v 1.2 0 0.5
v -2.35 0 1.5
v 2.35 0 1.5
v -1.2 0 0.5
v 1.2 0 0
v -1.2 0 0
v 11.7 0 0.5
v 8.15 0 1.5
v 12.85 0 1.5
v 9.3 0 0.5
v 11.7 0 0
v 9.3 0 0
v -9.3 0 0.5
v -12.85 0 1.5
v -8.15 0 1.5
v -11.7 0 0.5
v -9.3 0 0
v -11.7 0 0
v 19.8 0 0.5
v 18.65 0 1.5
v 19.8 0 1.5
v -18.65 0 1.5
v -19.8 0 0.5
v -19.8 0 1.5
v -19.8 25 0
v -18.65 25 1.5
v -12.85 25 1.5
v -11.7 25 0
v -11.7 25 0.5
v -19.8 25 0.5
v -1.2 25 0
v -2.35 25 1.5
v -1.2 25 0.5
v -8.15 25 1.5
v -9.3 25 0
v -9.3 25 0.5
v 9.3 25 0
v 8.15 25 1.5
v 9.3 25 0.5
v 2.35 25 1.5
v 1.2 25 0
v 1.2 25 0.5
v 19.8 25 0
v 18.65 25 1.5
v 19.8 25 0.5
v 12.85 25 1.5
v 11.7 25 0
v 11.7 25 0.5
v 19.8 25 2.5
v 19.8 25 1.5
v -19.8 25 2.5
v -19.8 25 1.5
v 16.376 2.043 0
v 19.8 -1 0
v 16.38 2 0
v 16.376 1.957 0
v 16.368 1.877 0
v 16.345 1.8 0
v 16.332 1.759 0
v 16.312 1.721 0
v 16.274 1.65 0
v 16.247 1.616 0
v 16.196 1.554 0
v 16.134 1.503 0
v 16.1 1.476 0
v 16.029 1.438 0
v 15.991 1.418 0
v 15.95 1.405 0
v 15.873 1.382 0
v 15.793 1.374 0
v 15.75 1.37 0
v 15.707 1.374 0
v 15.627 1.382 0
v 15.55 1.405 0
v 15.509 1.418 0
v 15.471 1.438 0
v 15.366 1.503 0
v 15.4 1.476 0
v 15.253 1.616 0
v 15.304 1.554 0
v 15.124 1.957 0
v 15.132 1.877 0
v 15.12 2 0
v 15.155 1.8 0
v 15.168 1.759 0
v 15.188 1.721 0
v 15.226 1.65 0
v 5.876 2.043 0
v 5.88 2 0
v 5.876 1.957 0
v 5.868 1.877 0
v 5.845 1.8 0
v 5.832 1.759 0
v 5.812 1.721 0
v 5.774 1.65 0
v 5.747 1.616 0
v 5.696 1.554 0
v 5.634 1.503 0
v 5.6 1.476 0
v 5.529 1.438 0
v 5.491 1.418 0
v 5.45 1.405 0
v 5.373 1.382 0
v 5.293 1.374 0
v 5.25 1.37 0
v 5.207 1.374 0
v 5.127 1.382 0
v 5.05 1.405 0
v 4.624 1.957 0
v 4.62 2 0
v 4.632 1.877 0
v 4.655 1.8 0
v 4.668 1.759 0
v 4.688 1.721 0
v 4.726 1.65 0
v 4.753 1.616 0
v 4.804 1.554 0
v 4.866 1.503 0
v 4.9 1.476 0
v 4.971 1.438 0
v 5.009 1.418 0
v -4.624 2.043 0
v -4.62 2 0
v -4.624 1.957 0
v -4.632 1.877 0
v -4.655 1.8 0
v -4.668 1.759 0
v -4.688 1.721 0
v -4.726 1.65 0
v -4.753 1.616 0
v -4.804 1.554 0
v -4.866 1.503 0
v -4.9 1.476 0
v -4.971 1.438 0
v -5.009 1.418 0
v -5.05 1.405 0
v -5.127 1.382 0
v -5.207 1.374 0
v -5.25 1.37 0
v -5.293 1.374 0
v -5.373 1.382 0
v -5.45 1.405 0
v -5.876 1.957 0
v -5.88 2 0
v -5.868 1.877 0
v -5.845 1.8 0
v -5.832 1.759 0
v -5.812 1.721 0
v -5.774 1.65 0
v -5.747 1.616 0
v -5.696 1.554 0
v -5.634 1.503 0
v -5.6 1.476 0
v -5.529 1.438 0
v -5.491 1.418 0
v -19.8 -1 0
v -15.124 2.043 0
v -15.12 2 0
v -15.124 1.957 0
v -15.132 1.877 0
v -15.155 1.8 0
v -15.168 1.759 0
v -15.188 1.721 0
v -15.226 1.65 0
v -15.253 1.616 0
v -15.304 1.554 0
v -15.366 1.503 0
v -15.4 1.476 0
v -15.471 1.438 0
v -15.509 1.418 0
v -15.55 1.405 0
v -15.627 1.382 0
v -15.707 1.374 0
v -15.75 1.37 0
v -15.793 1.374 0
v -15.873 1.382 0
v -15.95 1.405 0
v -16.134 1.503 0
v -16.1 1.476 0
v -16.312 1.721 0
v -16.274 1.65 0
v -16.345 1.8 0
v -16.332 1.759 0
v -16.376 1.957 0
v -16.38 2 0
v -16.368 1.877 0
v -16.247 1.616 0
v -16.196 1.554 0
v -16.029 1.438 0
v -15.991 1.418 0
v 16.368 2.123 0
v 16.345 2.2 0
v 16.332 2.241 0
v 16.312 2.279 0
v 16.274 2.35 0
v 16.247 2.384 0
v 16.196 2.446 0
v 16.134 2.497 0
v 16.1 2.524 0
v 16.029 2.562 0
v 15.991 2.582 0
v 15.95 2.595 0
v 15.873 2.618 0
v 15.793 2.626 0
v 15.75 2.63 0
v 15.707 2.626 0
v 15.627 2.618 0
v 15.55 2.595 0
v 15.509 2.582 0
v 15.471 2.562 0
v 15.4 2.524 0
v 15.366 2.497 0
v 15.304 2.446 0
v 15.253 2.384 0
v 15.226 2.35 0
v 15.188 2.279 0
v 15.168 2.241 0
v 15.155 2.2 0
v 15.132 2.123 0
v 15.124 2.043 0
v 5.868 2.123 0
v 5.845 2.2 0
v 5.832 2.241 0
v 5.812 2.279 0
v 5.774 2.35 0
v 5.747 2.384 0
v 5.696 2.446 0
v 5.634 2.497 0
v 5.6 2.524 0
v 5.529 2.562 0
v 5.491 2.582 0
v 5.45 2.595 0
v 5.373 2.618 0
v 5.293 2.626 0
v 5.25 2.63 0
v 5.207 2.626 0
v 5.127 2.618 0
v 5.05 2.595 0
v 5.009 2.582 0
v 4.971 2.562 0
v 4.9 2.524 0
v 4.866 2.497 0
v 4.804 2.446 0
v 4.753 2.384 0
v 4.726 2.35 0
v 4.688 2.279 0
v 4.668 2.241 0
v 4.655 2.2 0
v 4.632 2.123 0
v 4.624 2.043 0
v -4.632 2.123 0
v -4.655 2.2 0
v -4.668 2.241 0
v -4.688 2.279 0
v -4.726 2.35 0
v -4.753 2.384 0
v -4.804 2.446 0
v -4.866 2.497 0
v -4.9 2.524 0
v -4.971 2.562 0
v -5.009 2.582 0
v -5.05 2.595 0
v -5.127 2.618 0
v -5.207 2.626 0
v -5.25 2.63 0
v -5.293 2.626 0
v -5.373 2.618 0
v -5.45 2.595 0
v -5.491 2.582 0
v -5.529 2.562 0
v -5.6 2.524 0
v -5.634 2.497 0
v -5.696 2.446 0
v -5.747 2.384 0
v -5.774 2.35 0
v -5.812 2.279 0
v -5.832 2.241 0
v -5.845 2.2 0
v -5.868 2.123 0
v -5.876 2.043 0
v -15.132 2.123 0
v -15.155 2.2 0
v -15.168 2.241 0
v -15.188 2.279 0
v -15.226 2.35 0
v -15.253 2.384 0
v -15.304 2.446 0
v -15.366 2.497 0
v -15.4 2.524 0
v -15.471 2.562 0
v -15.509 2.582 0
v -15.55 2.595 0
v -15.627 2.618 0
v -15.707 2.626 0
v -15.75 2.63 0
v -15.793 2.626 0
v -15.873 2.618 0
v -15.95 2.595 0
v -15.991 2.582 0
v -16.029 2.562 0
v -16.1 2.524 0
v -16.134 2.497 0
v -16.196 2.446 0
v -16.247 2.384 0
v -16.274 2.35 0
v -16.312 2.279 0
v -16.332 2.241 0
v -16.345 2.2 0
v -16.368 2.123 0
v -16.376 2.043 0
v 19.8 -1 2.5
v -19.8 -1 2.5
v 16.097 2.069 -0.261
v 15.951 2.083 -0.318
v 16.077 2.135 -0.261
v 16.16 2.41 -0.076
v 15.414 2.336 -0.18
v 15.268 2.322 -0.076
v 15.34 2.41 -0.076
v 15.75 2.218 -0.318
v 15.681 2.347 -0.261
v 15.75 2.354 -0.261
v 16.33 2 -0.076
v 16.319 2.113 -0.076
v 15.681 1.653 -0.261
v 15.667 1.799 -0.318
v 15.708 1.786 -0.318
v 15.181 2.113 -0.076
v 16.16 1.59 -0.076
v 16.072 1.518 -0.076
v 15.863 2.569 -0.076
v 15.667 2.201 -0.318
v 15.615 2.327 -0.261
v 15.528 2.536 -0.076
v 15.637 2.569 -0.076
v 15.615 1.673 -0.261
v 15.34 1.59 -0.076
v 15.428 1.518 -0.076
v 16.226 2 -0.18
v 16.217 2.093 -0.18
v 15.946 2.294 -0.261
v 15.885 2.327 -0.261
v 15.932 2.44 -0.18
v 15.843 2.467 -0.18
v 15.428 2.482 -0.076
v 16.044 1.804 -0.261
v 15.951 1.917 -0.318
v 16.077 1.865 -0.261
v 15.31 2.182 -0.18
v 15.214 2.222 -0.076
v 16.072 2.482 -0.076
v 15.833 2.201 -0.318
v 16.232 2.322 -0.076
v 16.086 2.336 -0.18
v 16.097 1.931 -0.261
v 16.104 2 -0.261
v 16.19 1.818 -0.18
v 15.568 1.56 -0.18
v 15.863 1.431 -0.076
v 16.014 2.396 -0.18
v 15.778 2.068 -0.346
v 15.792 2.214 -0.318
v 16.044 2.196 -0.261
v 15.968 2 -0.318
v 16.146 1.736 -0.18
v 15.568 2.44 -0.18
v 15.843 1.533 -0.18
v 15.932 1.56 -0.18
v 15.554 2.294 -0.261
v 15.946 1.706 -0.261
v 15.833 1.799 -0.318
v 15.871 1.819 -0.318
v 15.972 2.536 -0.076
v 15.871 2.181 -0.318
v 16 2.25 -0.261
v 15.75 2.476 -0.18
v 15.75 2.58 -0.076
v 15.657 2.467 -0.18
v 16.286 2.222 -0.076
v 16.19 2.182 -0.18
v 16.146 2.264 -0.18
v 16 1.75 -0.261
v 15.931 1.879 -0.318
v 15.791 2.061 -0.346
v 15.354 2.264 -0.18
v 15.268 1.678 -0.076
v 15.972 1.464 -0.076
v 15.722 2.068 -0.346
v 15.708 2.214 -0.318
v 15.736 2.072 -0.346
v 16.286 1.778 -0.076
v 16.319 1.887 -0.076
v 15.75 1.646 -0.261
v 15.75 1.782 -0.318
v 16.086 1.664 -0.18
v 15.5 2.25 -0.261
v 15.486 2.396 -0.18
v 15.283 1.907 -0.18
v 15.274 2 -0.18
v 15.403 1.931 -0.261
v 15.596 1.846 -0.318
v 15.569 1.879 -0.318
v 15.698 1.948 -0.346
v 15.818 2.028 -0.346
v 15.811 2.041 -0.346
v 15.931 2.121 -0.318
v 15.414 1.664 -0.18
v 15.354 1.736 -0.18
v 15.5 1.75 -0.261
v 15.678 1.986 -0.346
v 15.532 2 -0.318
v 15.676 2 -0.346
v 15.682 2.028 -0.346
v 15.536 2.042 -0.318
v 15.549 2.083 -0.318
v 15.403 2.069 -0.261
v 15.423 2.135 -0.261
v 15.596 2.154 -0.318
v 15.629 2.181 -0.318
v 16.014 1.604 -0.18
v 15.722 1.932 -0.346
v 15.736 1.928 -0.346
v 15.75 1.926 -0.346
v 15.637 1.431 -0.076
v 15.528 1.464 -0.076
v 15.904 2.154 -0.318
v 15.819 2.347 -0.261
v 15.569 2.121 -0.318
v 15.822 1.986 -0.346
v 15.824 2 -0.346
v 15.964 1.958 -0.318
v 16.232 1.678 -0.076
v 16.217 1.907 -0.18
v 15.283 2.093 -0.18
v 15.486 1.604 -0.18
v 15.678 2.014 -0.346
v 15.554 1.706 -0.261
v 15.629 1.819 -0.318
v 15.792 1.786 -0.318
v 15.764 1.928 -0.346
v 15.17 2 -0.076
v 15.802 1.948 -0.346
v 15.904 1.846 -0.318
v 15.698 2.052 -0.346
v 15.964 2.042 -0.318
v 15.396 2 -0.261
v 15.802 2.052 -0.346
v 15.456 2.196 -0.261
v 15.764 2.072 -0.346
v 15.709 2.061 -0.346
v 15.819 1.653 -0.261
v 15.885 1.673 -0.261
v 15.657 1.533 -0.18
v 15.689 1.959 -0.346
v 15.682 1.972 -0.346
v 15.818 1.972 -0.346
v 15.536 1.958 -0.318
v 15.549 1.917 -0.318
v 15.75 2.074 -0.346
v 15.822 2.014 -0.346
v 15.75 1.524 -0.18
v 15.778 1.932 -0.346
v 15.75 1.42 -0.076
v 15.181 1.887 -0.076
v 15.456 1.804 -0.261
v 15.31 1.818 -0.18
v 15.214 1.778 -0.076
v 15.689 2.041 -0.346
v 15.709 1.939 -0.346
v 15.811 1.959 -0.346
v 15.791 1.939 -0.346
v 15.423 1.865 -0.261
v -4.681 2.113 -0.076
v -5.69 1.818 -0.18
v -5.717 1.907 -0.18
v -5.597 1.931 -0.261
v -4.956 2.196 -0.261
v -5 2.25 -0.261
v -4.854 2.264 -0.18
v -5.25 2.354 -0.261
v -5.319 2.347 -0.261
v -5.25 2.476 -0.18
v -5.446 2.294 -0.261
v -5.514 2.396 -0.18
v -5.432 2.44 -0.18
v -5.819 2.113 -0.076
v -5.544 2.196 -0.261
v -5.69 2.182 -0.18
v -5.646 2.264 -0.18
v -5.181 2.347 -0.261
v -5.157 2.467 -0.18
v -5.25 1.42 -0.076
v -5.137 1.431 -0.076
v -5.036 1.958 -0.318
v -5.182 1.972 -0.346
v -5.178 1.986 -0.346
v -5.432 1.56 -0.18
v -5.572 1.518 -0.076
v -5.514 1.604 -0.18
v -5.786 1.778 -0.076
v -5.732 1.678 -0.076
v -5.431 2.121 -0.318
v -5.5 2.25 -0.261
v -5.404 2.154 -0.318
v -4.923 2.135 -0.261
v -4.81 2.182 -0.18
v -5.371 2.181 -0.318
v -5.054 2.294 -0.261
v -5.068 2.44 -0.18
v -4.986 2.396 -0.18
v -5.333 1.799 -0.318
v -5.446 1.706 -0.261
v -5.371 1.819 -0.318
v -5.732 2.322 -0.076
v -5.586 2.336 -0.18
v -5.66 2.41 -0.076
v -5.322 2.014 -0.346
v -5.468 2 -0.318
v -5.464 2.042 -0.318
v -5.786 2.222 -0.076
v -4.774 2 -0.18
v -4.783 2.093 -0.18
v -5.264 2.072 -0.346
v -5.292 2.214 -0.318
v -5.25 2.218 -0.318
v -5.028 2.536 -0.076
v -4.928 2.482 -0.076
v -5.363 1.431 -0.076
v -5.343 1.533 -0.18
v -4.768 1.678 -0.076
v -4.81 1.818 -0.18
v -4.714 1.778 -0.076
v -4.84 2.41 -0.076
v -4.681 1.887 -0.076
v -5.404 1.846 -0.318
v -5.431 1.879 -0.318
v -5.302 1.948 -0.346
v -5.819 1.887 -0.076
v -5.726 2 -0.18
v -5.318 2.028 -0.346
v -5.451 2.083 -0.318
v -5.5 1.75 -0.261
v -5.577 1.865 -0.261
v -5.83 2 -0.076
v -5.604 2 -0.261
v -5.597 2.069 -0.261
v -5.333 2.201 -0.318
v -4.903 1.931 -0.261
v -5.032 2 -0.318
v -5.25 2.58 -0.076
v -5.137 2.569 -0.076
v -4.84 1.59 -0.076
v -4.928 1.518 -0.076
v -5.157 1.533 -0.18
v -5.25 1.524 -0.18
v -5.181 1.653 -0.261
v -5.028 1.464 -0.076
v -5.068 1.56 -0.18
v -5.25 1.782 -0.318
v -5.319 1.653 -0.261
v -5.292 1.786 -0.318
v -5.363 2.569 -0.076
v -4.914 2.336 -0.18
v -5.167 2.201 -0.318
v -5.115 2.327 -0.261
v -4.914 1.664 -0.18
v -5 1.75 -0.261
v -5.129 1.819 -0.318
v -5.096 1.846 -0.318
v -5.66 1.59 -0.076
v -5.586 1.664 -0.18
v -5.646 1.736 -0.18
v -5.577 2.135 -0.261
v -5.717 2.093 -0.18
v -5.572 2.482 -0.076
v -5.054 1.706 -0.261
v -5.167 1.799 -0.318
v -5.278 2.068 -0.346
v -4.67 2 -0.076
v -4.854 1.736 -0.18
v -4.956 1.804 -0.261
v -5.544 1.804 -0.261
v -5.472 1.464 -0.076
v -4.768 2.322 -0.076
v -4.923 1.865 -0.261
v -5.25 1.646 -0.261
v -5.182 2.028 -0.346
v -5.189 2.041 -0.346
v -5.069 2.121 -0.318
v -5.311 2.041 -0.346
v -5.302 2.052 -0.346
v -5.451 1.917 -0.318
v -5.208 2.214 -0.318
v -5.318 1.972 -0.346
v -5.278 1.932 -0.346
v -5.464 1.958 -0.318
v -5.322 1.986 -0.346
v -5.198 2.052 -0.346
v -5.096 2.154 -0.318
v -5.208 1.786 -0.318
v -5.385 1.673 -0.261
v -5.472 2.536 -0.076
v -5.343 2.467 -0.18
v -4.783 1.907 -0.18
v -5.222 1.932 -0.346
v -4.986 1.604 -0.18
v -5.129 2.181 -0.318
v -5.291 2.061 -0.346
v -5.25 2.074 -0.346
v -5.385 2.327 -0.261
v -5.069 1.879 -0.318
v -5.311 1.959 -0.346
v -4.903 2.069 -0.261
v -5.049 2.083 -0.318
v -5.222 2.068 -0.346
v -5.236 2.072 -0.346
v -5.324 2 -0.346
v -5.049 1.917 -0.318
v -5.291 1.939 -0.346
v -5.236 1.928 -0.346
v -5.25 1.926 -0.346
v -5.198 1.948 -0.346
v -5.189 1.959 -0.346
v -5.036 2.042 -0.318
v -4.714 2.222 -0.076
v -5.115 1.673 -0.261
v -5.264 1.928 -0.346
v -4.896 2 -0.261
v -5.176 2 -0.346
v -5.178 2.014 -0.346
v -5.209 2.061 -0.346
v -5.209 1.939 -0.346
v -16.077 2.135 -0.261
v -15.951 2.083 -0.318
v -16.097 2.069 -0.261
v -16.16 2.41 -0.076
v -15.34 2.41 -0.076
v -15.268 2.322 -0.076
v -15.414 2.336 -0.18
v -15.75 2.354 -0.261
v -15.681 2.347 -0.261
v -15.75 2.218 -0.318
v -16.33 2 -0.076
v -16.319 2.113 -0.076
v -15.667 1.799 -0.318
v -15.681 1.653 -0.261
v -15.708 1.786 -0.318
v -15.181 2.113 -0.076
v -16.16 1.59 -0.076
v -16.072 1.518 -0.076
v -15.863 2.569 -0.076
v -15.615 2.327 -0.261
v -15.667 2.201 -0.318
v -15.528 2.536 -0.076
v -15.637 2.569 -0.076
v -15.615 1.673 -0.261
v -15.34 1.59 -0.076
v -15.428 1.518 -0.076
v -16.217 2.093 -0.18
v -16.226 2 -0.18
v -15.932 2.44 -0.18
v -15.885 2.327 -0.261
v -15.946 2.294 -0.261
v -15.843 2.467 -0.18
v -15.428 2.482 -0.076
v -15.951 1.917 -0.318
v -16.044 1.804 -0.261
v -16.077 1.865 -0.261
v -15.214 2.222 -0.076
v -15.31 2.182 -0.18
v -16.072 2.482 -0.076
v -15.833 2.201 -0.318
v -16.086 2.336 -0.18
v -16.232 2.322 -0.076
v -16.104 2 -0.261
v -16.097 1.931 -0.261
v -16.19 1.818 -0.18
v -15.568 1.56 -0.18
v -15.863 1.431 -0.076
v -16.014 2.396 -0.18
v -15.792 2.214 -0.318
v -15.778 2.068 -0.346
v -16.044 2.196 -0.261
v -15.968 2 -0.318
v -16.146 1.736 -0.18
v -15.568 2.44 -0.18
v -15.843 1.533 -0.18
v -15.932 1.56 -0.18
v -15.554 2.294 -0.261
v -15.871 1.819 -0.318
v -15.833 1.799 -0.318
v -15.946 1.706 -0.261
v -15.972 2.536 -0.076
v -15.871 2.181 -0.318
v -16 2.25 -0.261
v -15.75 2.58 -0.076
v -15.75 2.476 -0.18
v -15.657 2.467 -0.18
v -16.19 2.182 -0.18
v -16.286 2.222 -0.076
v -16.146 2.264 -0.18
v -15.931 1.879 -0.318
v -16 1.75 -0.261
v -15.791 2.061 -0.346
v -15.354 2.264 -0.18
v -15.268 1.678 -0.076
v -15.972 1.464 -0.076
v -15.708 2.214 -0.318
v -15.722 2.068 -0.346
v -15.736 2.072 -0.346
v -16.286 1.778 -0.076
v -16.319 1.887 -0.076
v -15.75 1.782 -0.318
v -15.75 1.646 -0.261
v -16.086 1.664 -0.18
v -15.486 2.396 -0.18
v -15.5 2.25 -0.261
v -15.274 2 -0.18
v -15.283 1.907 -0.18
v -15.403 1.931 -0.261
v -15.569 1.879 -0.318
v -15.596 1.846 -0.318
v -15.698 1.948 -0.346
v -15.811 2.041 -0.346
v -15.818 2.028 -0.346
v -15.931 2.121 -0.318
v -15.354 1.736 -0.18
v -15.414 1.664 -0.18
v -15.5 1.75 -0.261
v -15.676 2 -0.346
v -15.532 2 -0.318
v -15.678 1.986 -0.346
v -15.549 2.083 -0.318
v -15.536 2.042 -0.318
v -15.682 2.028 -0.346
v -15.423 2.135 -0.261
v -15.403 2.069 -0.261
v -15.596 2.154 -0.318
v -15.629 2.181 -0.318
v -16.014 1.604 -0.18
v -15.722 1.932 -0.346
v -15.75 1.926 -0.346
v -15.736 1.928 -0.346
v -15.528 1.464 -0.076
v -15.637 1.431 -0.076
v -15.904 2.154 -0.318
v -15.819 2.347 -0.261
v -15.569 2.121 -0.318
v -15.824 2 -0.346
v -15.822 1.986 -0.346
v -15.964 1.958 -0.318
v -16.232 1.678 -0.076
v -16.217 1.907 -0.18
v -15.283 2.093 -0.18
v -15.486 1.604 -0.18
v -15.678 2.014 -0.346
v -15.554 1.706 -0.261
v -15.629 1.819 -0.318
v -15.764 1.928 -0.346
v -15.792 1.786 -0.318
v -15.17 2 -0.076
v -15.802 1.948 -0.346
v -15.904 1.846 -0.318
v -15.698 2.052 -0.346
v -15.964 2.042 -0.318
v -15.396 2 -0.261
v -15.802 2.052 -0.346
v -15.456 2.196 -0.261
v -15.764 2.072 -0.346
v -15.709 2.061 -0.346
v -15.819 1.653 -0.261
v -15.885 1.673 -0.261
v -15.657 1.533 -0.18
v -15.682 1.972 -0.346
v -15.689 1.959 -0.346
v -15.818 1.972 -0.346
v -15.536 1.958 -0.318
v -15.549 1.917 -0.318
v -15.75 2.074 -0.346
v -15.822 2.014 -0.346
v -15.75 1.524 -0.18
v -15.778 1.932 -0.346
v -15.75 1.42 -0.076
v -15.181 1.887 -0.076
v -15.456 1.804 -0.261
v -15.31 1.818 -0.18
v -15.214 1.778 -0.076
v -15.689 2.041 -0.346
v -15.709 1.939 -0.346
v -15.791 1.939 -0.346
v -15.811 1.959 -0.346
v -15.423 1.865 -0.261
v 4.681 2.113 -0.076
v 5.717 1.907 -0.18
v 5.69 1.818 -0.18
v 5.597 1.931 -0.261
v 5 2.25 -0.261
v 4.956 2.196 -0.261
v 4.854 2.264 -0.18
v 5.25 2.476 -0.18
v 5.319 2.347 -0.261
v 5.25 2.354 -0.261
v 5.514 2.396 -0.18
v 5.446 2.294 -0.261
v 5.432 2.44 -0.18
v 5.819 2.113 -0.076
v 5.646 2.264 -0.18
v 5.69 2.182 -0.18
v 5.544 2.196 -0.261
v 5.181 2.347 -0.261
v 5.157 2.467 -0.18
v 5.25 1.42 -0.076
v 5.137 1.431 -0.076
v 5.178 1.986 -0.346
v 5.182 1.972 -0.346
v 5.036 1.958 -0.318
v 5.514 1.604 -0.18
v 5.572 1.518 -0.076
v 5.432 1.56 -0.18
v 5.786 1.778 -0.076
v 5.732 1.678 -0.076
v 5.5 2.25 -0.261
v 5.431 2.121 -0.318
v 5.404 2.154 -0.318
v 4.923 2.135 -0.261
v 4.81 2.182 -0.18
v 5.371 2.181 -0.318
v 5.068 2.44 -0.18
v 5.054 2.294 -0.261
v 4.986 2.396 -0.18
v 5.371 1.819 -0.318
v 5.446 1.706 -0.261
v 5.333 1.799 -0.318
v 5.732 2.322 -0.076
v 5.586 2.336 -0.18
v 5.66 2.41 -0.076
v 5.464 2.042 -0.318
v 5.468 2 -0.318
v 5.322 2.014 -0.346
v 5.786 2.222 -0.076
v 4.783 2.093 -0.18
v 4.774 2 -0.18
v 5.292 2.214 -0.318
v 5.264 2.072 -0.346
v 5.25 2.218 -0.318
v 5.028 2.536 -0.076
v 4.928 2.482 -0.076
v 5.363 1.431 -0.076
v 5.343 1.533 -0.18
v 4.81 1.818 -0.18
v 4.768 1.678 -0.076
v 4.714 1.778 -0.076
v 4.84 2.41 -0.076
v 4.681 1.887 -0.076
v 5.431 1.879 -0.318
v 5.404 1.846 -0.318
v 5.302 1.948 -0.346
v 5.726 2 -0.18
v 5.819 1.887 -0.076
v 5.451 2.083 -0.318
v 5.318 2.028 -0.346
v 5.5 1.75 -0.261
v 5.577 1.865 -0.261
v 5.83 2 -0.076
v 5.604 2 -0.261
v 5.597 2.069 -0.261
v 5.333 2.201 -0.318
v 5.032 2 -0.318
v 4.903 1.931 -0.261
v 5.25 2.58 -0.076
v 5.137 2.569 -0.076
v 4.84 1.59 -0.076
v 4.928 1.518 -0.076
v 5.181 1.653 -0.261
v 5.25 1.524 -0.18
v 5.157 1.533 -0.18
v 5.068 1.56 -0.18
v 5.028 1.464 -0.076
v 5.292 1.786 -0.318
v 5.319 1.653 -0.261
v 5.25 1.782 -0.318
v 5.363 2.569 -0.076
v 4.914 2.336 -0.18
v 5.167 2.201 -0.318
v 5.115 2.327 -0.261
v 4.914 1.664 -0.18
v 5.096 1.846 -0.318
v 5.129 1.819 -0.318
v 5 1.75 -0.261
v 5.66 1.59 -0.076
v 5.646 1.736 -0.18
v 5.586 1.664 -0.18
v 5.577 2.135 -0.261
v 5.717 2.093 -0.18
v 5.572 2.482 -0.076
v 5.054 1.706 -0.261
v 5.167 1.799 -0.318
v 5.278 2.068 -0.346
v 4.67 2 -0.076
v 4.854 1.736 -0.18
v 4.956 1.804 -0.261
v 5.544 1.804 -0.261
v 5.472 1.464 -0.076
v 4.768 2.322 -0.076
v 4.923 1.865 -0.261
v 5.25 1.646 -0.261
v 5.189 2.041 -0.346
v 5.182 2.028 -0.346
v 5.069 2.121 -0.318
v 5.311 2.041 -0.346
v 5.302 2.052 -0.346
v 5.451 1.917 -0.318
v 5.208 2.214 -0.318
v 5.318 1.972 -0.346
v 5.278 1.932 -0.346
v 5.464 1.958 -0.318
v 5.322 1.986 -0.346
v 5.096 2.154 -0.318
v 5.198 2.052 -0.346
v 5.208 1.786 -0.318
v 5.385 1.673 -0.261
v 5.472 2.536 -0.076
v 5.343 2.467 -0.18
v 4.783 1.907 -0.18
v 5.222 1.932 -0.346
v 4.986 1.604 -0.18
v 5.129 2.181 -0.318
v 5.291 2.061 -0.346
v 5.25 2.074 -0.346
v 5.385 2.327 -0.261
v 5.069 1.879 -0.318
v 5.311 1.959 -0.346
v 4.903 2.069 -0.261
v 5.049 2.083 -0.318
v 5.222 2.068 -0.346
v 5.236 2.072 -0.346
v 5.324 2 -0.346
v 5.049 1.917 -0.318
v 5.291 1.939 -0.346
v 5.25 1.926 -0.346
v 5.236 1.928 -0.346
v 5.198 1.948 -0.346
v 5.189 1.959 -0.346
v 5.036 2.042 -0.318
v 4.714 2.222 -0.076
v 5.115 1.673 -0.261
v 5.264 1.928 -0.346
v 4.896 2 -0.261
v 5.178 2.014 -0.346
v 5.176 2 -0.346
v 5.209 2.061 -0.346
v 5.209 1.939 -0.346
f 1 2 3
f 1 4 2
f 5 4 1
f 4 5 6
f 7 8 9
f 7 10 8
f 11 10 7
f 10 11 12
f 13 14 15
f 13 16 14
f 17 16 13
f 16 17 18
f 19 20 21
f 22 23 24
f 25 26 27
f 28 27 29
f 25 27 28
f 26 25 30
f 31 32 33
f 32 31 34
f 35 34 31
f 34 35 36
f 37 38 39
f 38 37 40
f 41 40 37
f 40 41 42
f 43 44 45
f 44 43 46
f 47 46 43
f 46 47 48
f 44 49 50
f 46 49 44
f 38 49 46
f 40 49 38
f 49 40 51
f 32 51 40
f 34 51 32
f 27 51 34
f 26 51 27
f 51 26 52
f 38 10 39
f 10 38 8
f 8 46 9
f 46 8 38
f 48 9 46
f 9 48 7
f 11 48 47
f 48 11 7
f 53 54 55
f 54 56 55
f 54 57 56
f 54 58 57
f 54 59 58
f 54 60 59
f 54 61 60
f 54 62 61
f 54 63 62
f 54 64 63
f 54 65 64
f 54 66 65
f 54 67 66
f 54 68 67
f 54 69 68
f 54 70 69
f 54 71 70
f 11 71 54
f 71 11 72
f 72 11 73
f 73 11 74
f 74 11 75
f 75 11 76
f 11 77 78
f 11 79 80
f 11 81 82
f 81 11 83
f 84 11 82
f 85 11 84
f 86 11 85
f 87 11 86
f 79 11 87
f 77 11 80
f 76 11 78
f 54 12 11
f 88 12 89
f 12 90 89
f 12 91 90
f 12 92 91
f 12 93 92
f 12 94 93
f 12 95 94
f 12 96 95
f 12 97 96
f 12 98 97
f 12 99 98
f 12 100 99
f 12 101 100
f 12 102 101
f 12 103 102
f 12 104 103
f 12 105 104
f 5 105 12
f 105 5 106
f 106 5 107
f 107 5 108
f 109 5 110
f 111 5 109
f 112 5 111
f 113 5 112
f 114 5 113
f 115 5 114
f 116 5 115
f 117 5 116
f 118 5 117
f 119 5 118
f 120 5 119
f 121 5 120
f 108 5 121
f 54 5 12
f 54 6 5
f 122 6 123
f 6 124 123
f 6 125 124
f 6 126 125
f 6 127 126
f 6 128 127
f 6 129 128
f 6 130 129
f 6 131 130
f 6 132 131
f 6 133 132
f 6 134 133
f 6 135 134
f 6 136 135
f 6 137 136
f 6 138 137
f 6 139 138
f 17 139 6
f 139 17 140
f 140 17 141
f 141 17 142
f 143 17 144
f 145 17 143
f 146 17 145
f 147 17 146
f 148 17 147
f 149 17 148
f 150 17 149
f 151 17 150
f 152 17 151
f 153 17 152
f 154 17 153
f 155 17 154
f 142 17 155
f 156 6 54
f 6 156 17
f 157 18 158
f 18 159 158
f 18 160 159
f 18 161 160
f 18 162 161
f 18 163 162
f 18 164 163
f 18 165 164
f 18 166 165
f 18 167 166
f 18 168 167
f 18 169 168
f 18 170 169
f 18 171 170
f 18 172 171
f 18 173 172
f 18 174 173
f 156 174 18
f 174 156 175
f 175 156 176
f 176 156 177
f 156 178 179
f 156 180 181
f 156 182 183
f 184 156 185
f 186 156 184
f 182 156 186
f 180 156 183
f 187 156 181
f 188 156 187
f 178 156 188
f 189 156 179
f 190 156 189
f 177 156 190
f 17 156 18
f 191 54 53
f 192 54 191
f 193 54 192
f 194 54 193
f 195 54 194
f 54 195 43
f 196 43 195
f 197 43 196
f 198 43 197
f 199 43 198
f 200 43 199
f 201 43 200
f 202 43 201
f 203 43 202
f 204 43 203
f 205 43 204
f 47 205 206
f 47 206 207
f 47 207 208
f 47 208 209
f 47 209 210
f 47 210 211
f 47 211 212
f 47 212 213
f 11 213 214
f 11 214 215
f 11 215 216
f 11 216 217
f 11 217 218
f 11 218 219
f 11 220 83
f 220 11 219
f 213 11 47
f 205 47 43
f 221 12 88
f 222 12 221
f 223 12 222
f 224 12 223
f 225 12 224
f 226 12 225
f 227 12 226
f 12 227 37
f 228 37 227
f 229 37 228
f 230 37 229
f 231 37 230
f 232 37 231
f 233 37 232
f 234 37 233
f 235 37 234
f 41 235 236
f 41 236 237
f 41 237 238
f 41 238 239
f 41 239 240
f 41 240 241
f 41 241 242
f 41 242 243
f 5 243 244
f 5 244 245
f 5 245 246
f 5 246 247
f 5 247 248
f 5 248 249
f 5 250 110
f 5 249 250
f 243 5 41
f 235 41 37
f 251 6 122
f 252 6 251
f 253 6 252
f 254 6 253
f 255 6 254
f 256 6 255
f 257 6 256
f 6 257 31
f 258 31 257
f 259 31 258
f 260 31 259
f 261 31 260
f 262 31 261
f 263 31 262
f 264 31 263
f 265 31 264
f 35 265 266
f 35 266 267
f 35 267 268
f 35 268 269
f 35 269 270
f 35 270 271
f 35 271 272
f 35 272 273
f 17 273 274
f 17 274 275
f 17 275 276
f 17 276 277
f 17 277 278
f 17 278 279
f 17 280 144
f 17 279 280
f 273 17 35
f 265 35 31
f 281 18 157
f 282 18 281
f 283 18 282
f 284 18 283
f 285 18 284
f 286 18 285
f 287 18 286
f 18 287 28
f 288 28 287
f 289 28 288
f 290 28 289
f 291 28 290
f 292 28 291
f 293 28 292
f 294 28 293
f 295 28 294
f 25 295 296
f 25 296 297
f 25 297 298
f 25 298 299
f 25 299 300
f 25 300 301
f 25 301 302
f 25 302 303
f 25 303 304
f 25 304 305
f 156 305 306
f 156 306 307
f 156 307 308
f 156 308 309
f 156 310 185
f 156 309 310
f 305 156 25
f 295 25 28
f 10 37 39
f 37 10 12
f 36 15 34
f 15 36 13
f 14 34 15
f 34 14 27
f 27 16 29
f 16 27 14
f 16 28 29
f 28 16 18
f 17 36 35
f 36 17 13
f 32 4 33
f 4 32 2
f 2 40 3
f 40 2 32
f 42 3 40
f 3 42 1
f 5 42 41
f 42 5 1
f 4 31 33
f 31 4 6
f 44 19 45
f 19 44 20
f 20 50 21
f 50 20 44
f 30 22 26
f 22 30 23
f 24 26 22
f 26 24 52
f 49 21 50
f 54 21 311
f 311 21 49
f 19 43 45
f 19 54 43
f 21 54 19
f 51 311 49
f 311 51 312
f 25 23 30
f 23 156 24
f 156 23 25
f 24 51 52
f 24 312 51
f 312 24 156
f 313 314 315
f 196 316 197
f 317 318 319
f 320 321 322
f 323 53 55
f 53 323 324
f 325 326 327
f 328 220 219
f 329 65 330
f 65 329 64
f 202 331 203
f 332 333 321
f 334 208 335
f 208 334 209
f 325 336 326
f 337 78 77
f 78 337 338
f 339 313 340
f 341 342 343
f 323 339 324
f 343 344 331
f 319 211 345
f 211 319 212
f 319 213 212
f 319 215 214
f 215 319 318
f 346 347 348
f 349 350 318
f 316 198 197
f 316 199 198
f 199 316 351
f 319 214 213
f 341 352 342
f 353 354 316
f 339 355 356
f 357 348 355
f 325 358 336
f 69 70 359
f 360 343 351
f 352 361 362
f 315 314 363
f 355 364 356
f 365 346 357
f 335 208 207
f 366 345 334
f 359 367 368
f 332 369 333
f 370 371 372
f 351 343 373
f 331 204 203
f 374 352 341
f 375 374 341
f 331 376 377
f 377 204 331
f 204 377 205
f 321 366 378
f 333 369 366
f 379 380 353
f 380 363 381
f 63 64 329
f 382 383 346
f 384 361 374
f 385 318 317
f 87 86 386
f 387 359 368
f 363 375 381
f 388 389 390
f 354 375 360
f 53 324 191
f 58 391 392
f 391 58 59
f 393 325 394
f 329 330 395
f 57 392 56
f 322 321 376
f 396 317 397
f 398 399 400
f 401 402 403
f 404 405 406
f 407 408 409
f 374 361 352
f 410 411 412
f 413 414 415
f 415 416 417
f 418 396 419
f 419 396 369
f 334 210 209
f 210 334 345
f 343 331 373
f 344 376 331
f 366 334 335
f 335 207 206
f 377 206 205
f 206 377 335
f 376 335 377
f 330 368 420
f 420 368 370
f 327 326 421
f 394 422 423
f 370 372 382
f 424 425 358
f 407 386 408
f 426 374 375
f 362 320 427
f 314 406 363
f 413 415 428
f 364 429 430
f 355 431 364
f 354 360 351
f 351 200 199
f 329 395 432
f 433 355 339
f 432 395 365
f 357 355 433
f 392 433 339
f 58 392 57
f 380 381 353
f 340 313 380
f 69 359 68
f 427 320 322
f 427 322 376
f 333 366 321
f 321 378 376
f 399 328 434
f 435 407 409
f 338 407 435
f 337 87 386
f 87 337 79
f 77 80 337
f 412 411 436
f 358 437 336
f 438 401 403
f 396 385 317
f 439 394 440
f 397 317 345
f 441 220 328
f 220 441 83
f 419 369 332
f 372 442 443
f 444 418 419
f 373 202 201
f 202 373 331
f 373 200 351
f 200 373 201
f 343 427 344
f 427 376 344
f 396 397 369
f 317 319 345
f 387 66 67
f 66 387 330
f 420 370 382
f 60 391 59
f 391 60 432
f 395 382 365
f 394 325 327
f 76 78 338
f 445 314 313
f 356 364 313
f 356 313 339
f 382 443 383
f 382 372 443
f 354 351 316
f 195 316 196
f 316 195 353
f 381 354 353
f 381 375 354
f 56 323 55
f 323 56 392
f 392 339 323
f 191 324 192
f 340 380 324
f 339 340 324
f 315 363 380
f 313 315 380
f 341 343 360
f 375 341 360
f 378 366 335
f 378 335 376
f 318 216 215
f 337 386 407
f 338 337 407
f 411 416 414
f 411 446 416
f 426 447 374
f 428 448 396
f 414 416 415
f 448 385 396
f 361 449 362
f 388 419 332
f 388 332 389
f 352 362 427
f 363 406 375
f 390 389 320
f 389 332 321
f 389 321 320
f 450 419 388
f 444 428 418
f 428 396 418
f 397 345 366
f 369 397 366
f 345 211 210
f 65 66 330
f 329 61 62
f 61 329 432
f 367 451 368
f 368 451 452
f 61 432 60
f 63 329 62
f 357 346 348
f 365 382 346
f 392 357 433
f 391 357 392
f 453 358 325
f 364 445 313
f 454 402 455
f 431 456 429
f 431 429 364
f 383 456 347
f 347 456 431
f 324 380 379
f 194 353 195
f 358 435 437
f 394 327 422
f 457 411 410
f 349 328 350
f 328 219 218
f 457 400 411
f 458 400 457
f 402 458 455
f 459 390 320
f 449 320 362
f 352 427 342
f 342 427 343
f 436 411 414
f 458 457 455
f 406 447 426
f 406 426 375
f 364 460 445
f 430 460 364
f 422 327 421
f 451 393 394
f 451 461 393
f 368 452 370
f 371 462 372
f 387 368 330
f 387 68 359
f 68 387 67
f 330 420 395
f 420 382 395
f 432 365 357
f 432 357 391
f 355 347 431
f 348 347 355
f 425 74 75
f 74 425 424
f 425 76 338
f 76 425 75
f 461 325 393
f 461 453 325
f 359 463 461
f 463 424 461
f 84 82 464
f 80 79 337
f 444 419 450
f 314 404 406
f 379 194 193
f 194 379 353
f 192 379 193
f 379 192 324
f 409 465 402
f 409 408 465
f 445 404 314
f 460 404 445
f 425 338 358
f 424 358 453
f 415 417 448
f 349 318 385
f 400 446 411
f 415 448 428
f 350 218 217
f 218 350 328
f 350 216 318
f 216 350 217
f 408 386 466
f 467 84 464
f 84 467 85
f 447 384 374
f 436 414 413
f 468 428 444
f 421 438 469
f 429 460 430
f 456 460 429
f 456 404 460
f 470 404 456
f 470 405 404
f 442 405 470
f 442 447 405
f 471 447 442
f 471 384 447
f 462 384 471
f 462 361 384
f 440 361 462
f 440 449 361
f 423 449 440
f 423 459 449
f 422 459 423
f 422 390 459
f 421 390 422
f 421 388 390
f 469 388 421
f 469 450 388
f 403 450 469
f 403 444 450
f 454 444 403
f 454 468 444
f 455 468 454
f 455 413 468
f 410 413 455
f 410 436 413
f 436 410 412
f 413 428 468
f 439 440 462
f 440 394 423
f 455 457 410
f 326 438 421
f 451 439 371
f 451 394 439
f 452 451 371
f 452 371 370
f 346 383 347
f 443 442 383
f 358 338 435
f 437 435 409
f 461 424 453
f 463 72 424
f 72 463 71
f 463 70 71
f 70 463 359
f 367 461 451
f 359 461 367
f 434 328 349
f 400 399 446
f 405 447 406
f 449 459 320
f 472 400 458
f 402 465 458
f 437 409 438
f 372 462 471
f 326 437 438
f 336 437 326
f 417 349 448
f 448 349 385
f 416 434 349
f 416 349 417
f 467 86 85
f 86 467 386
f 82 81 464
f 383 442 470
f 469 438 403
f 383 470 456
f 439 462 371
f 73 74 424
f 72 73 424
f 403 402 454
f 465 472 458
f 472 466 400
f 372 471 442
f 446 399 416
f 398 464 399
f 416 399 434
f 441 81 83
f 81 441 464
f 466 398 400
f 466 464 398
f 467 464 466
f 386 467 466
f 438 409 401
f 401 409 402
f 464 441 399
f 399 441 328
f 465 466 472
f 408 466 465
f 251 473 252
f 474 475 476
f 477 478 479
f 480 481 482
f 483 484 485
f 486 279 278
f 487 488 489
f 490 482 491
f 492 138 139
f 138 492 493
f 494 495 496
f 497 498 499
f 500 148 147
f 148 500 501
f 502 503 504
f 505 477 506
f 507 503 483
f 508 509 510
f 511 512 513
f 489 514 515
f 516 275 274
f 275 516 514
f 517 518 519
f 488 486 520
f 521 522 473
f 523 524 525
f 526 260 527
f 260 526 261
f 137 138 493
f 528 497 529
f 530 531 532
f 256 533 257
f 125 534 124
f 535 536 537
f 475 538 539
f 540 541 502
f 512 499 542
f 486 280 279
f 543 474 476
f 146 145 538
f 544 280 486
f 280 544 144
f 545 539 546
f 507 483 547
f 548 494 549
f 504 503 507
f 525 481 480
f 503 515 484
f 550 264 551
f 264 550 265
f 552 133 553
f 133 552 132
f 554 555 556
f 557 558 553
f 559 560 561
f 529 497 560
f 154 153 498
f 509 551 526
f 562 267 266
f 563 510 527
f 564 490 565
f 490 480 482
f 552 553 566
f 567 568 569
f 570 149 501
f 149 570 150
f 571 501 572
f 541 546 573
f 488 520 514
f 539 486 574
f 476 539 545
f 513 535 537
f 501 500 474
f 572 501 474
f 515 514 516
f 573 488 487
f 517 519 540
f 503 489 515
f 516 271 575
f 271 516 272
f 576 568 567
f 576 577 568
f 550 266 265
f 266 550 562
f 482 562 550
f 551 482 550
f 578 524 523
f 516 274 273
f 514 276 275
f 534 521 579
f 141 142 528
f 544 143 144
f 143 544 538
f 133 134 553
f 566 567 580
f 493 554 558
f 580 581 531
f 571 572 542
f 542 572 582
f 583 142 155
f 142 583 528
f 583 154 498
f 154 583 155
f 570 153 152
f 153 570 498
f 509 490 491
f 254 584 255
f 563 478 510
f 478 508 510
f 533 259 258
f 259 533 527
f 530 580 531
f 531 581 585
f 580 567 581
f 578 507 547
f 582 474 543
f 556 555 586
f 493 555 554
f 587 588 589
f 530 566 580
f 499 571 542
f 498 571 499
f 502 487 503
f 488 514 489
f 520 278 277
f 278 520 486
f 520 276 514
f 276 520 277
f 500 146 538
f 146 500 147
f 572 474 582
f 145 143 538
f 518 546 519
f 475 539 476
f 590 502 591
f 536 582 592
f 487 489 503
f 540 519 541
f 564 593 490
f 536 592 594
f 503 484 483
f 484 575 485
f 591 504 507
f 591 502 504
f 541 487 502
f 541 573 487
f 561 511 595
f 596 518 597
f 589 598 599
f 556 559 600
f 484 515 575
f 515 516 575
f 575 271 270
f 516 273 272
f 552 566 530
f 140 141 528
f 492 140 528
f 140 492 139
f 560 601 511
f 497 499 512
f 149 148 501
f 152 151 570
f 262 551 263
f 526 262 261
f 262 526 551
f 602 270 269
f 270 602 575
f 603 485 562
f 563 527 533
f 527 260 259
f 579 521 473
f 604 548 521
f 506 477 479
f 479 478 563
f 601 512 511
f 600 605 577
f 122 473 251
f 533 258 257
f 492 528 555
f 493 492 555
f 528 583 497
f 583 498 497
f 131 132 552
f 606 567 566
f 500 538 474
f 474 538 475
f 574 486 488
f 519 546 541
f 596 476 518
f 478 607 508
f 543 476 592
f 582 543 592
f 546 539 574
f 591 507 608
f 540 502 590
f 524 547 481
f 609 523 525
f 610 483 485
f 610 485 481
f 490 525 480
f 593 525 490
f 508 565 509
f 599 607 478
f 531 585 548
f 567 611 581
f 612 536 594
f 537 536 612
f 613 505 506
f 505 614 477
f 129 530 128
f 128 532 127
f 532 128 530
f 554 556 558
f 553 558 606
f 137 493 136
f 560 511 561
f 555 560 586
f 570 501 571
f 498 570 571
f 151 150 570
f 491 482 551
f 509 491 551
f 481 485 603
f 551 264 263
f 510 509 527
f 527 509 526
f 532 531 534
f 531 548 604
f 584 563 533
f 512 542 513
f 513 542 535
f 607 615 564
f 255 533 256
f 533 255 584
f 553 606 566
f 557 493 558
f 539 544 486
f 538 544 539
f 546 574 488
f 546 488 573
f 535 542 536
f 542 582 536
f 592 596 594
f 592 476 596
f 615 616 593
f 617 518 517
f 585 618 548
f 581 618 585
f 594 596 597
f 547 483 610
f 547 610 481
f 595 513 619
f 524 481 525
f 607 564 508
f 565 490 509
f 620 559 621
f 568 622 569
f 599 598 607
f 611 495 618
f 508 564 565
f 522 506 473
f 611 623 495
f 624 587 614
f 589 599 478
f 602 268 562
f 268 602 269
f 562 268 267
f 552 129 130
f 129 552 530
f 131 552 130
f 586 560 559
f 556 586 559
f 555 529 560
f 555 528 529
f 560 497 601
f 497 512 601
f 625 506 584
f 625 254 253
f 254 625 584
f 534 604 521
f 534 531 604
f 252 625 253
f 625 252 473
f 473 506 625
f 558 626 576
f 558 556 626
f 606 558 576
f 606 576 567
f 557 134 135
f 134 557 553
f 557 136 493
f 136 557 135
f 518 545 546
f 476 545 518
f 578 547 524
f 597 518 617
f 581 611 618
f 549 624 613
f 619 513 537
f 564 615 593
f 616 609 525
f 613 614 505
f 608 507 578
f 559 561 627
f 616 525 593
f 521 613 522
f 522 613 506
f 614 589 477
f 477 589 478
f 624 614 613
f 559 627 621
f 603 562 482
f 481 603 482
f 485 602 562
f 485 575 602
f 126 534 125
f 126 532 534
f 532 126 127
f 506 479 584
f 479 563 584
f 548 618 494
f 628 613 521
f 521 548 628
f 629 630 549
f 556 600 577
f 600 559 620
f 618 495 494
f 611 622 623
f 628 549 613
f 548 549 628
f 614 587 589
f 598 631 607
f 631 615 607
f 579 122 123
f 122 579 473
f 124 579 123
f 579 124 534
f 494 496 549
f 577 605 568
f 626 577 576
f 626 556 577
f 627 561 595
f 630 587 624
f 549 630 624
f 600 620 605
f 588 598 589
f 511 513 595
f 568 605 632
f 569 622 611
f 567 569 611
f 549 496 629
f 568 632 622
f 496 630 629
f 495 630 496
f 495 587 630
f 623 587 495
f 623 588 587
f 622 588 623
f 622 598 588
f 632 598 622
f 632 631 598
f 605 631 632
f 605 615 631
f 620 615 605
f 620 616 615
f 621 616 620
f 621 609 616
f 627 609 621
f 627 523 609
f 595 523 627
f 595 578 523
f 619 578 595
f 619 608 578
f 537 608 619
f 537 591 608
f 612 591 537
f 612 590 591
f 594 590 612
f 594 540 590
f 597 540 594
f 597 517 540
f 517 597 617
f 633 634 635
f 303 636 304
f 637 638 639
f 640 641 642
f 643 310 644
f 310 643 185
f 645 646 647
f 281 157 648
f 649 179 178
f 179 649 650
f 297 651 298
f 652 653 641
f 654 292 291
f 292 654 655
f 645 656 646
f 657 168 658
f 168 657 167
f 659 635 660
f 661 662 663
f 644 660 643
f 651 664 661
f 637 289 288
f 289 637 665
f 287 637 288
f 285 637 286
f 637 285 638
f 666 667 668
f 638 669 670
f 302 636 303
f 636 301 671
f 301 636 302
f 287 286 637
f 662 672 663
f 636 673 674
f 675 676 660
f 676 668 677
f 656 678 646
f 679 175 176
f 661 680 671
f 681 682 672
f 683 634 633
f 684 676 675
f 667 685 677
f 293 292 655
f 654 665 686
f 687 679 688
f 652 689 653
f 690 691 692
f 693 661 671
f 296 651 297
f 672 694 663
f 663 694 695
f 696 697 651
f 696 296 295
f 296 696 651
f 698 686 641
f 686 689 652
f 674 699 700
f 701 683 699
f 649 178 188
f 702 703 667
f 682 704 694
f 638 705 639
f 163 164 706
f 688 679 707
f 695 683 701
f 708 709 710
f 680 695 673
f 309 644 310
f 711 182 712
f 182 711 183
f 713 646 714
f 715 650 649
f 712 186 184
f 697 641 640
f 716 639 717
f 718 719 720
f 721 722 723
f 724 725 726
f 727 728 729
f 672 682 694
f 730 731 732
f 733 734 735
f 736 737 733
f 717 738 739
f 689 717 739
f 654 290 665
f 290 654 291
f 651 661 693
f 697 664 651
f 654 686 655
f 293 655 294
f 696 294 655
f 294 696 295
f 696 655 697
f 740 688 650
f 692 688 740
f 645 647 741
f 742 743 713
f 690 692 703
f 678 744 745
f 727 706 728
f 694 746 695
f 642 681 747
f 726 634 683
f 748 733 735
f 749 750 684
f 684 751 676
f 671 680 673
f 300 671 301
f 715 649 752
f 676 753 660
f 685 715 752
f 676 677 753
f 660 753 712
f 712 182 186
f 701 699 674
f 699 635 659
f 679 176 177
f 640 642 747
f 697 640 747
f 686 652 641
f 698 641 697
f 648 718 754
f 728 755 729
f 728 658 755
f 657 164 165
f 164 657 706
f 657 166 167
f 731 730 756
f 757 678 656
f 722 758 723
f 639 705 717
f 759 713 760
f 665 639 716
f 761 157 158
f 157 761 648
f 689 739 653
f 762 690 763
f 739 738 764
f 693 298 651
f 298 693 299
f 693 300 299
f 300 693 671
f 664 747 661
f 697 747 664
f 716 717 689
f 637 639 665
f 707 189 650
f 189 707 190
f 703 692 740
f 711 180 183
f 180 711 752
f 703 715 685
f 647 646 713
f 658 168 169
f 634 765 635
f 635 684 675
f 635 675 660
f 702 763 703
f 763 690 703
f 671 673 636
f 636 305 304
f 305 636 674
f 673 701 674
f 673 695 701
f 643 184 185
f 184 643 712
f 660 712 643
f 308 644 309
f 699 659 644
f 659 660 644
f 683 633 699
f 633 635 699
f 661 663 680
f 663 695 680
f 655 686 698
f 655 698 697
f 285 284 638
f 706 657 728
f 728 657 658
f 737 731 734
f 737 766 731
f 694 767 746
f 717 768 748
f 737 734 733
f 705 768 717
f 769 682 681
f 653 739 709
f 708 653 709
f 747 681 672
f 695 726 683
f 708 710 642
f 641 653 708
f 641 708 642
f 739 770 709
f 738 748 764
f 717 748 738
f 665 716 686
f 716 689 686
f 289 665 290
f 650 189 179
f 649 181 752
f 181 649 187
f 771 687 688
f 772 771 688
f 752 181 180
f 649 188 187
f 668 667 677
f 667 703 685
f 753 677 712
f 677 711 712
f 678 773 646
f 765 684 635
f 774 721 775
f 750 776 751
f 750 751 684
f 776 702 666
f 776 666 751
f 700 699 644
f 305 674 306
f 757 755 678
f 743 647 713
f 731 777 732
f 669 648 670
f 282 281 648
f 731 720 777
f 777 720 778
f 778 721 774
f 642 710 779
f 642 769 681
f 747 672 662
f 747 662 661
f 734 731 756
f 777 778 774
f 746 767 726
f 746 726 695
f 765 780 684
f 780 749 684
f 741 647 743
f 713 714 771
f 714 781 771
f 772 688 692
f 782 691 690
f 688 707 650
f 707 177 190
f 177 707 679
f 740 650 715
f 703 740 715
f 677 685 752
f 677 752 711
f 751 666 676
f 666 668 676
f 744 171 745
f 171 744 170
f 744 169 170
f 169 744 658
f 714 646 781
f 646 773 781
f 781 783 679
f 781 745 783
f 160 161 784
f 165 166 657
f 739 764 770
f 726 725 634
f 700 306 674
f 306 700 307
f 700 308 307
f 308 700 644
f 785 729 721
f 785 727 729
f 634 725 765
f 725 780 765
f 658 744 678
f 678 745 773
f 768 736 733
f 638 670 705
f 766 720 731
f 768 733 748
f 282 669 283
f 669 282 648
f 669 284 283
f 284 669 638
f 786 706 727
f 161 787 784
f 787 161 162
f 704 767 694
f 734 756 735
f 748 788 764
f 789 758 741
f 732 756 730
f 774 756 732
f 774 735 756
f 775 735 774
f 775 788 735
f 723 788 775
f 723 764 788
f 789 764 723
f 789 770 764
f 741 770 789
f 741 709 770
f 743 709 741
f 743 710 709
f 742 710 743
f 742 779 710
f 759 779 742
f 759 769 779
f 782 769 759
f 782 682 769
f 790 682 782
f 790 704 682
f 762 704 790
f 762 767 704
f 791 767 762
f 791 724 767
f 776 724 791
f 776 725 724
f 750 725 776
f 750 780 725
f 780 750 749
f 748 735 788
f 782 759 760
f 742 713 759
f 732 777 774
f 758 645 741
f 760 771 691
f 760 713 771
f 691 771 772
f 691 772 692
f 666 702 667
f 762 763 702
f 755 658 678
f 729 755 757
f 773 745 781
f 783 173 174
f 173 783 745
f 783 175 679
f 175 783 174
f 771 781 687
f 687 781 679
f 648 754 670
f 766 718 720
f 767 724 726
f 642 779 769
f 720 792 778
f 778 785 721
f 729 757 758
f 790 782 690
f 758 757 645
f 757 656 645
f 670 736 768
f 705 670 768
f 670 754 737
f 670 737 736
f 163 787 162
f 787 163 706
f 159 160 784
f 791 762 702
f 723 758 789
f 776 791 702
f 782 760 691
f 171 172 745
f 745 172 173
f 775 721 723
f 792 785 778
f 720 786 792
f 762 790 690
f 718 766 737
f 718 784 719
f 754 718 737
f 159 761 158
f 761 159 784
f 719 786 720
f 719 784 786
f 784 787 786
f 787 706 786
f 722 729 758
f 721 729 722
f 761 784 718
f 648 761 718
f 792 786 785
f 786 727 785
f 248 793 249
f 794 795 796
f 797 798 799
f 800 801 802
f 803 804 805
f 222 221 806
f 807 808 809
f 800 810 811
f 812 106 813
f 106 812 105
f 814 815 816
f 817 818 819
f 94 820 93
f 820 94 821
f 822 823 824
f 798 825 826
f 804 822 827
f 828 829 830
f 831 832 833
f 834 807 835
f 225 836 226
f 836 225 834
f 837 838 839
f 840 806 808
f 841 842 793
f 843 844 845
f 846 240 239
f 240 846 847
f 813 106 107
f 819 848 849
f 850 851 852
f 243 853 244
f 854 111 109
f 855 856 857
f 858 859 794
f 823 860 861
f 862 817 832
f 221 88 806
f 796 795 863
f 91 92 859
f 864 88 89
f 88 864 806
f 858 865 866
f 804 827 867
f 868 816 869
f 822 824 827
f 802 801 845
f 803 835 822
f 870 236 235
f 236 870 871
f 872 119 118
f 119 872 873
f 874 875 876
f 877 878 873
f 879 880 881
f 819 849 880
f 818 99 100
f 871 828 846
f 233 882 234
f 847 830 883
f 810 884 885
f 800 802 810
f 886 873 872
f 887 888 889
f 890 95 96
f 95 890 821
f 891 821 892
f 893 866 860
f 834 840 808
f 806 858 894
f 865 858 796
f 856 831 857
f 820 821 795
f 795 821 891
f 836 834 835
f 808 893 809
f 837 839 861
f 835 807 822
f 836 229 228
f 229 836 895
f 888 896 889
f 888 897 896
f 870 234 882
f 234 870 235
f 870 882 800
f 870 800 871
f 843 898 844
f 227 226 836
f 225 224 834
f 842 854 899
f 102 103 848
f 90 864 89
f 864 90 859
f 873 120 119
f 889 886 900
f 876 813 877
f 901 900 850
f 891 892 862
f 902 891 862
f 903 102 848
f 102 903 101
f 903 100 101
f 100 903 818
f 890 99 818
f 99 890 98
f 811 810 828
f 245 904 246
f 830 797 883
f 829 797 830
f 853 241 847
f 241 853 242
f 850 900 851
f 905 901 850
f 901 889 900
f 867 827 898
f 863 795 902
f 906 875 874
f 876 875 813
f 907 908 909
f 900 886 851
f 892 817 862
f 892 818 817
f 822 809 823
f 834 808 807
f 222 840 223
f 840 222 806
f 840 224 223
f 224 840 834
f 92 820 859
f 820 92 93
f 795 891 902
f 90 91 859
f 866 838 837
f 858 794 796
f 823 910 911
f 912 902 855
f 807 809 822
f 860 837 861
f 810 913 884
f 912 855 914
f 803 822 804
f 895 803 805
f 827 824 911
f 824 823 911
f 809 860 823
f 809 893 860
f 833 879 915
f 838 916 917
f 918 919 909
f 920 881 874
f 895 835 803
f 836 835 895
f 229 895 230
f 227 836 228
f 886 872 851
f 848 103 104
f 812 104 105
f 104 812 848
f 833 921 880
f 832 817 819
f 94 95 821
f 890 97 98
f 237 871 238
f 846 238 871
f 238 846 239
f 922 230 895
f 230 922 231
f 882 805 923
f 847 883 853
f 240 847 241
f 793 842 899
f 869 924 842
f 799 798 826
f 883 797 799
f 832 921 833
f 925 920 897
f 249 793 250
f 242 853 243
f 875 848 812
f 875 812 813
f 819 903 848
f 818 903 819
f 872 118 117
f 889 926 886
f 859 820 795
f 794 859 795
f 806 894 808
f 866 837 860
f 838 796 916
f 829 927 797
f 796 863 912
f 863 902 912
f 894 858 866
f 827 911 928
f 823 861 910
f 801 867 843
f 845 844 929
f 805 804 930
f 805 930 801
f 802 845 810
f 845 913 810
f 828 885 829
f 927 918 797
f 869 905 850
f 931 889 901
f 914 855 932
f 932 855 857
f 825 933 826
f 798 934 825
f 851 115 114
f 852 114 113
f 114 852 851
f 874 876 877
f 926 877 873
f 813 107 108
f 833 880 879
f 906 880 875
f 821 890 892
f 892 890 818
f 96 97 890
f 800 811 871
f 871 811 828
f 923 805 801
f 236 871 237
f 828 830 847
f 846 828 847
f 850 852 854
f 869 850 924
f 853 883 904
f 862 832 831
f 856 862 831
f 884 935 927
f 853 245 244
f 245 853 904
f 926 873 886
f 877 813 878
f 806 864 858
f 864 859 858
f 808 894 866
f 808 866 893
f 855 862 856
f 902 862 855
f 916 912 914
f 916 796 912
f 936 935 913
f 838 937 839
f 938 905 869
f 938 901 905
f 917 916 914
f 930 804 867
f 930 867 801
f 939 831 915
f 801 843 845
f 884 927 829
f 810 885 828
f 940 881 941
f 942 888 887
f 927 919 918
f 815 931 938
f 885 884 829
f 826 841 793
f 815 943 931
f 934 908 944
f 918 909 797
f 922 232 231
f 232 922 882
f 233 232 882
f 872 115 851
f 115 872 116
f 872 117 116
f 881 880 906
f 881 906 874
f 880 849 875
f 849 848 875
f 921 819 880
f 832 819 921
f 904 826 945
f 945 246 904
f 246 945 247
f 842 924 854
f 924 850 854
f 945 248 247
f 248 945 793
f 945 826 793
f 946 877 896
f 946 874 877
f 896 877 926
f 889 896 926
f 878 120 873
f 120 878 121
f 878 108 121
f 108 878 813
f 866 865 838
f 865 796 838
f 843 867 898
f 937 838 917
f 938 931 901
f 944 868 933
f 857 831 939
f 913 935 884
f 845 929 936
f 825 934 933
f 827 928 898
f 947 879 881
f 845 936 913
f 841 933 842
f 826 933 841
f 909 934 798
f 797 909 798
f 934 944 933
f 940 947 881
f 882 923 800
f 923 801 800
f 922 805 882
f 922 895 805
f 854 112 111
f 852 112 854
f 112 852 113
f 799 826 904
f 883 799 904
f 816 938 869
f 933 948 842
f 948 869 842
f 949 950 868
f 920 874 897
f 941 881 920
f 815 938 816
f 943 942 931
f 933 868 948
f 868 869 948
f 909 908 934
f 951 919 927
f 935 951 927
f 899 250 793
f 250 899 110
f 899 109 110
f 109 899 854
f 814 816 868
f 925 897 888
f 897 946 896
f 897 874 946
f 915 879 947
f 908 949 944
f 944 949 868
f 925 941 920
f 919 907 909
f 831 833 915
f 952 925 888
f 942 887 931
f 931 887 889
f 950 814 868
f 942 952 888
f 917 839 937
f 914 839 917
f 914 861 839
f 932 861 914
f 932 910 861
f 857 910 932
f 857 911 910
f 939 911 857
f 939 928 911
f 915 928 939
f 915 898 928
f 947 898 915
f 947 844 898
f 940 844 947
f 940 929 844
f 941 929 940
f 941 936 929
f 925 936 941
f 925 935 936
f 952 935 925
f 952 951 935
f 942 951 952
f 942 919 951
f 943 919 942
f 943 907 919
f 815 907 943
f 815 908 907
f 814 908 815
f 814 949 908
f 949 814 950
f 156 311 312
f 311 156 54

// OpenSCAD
$fa = 1;
$fs = $preview ? 1 : 0.15;
// Which part to make
PART = "mount"; // [ mount, lamp ]

//dovetail_mount_bottom();
parts();

module parts() { // Wow that name sure could be improved
    // This module is just a wrapper containing the shared variables between the two parts that I don't want to be global
    // Sheet
    sheet_width = 30;
    sheet_length = 200;
    // General
    locking_nubs_position = 2;
    // Lamp
    lamp_width = sheet_width + 14; // I still need to specify exactly where those 14mm come from
    lamp_wall_thickness = 2;
    // Mount
    mount_width = lamp_width + (-lamp_wall_thickness - 0.2) * 2;
    mount_length = 25;
    mount_thickness = 1 + 1.5; // The first 1mm is solid, the female dovetail is 1.5mm

    if (PART == "mount") {
        single_mount(
            length = mount_length, 
            width = mount_width, 
            height = mount_thickness,
            locking_nubs_position = locking_nubs_position,
            lamp_width = lamp_width
        );
    } else {
        // NYI
    }
}

module single_mount(length, width, height, locking_nubs_position, lamp_width) {
    // Creates a single mounting piece that can be taped to the surface where the lamp should be mounted. A lamp would typically use multiple of these
    // It starts with a base cube that gets 3 dovetails and some side slits cut into it, after that the additive features go on, that's a back stop and the locking nubs
    dovetail_rotation = [-90, 180, 0];
    back_stop_thickness = 1;

    difference() {
        // Base cube
        translate([-width / 2, 0, 0]) cube([width, length, height]);
        // Dovetails
        dovetails_distribution(lamp_width) {
            rotate(dovetail_rotation) dovetail(length);
        }
        // Side slits
        mirror_x() {
            female_dovetail_body_width = 2.4; // This is dependent on another variable but has to be changed manually if the other one is
            translate([(width + female_dovetail_body_width) / 2, 0, 0]) 
            rotate(dovetail_rotation) dovetail(length);
        }
    }
    // Back stop
    translate([-width / 2, -back_stop_thickness, 0]) cube([width, back_stop_thickness, height]);
    // Nubs
    dovetails_distribution(lamp_width, 0.5, false) { // Here I set the ratio to 1/2 to get the nubs to be centered between the dovetails
        dovetails_distribution(lamp_width, 1, false) { // We need 2 sets of nubs
            translate([0, locking_nubs_position, 0.4]) sphere(d = 1.5);
        }
    }
}

module dovetails_distribution(lamp_width, ratio = 1, middle_child = true) {
    // Makes 3 copies of the object passed to it in the pattern that the dovetails need to be in in the mount and consequently, on the lamp
    if (middle_child) children();
    mirror_x() {
        translate([(lamp_width / 2 - 1) / 2 * ratio, 0, 0]) // I don't know where -1 comes from
        children();
    }
}

// TODO: Clean up this module a bunch
module dovetail_mount_bottom() {
    rotate([90, 0, 0]) dovetail(25, true);
    // Middle dovetails
    mirror_x() {
        translate([(((30 + 14) / 2) - 1) / 2, 0, 0]) rotate([90, 0, 0]) dovetail(25, true);
    }
    // Walls
    for (i = [0, 1]) {
        width = 2;
        height = 1.5 + 1;

        mirror([i, 0, 0]) union() {
            translate([(30 + 14) / 2 - width, -25, 0]) cube([width, 25, height]);
            translate([(30 + 14) / 2 + 1 - width, 0, 0]) rotate([90, 0, 0]) {
                difference() {
                    dovetail(25, true);
                    cube([5, height, 25]);
                }
            }
        }
    }
    difference() {
        // Just for reference for now
        translate([(30 + 14) / -2, -25, -2]) cube([30 + 14, 25, 2]);

        // Lock nub holes
        for (i = [0, 1]) {
            cylinder_h = (((30 + 14) / 2) - 1) / 2 - 2;

            mirror([i, 0, 0]) {
                translate([2 / 2, -2, 0.3]) rotate([90, 0, 90]) cylinder(h = cylinder_h, d = 1.7);
                translate([(2 / 2) * 3 + cylinder_h, -2, 0.3]) rotate([90, 0, 90]) cylinder(h = cylinder_h, d = 1.7);
            }
        }
    }
}

module dovetail(length, male = false) {
    // Makes the dovetail that connects the mount to the lamp itself
    // This module makes both the male and female dovetail since the only thing that really varies between them is the dimensions
    // The whole part is just a 2d polygon that's linearly extruded to the given length
    // Dimensions:       Male  Female
    head_height = male ? 0.8 : 1  ;
    body_width  = male ? 2   : 2.4;
    body_height = male ? 0.6 : 0.5;
    head_width = body_width + 2 * (head_height + (male ? -0.05 : 0.15));
    // Calculated variables
    height = head_height + body_height;

    // This vector is actually only contains the half of the points on the positive side of the X-axis, it is effectively mirrored about the axis a little later
    path = [
        [body_width / 2, 0],
        [body_width / 2, body_height],
        male ? [head_width / 2, height - 0.2] : [head_width / 2, height], // I can't tell it to skip for the female, so I'm just placing a point on top of the next one
        [head_width / 2, height],
    ];

    linear_extrude(length)
    polygon(concat(path, reverse(flip_sign_x(path))));
    // I reverse the sign of the x coordinates of all the points in the `path` vector and put them in the right order with the reverse function to do the mirroring. Like the native mirror function it doesnt create a copy, so I need to concat the mirrored point vector with the original.
}

// Utility functions
function reverse(list) = [for (i = [len(list)-1:-1:0]) list[i]]; // From scad-utils
function flip_sign_x(list) = [ for (i = list) [ i[0] * -1, i[1] ] ];
module mirror_x() {
    for (i = [0, 1]) { mirror([i, 0, 0]) {
        children();
    }}
}
